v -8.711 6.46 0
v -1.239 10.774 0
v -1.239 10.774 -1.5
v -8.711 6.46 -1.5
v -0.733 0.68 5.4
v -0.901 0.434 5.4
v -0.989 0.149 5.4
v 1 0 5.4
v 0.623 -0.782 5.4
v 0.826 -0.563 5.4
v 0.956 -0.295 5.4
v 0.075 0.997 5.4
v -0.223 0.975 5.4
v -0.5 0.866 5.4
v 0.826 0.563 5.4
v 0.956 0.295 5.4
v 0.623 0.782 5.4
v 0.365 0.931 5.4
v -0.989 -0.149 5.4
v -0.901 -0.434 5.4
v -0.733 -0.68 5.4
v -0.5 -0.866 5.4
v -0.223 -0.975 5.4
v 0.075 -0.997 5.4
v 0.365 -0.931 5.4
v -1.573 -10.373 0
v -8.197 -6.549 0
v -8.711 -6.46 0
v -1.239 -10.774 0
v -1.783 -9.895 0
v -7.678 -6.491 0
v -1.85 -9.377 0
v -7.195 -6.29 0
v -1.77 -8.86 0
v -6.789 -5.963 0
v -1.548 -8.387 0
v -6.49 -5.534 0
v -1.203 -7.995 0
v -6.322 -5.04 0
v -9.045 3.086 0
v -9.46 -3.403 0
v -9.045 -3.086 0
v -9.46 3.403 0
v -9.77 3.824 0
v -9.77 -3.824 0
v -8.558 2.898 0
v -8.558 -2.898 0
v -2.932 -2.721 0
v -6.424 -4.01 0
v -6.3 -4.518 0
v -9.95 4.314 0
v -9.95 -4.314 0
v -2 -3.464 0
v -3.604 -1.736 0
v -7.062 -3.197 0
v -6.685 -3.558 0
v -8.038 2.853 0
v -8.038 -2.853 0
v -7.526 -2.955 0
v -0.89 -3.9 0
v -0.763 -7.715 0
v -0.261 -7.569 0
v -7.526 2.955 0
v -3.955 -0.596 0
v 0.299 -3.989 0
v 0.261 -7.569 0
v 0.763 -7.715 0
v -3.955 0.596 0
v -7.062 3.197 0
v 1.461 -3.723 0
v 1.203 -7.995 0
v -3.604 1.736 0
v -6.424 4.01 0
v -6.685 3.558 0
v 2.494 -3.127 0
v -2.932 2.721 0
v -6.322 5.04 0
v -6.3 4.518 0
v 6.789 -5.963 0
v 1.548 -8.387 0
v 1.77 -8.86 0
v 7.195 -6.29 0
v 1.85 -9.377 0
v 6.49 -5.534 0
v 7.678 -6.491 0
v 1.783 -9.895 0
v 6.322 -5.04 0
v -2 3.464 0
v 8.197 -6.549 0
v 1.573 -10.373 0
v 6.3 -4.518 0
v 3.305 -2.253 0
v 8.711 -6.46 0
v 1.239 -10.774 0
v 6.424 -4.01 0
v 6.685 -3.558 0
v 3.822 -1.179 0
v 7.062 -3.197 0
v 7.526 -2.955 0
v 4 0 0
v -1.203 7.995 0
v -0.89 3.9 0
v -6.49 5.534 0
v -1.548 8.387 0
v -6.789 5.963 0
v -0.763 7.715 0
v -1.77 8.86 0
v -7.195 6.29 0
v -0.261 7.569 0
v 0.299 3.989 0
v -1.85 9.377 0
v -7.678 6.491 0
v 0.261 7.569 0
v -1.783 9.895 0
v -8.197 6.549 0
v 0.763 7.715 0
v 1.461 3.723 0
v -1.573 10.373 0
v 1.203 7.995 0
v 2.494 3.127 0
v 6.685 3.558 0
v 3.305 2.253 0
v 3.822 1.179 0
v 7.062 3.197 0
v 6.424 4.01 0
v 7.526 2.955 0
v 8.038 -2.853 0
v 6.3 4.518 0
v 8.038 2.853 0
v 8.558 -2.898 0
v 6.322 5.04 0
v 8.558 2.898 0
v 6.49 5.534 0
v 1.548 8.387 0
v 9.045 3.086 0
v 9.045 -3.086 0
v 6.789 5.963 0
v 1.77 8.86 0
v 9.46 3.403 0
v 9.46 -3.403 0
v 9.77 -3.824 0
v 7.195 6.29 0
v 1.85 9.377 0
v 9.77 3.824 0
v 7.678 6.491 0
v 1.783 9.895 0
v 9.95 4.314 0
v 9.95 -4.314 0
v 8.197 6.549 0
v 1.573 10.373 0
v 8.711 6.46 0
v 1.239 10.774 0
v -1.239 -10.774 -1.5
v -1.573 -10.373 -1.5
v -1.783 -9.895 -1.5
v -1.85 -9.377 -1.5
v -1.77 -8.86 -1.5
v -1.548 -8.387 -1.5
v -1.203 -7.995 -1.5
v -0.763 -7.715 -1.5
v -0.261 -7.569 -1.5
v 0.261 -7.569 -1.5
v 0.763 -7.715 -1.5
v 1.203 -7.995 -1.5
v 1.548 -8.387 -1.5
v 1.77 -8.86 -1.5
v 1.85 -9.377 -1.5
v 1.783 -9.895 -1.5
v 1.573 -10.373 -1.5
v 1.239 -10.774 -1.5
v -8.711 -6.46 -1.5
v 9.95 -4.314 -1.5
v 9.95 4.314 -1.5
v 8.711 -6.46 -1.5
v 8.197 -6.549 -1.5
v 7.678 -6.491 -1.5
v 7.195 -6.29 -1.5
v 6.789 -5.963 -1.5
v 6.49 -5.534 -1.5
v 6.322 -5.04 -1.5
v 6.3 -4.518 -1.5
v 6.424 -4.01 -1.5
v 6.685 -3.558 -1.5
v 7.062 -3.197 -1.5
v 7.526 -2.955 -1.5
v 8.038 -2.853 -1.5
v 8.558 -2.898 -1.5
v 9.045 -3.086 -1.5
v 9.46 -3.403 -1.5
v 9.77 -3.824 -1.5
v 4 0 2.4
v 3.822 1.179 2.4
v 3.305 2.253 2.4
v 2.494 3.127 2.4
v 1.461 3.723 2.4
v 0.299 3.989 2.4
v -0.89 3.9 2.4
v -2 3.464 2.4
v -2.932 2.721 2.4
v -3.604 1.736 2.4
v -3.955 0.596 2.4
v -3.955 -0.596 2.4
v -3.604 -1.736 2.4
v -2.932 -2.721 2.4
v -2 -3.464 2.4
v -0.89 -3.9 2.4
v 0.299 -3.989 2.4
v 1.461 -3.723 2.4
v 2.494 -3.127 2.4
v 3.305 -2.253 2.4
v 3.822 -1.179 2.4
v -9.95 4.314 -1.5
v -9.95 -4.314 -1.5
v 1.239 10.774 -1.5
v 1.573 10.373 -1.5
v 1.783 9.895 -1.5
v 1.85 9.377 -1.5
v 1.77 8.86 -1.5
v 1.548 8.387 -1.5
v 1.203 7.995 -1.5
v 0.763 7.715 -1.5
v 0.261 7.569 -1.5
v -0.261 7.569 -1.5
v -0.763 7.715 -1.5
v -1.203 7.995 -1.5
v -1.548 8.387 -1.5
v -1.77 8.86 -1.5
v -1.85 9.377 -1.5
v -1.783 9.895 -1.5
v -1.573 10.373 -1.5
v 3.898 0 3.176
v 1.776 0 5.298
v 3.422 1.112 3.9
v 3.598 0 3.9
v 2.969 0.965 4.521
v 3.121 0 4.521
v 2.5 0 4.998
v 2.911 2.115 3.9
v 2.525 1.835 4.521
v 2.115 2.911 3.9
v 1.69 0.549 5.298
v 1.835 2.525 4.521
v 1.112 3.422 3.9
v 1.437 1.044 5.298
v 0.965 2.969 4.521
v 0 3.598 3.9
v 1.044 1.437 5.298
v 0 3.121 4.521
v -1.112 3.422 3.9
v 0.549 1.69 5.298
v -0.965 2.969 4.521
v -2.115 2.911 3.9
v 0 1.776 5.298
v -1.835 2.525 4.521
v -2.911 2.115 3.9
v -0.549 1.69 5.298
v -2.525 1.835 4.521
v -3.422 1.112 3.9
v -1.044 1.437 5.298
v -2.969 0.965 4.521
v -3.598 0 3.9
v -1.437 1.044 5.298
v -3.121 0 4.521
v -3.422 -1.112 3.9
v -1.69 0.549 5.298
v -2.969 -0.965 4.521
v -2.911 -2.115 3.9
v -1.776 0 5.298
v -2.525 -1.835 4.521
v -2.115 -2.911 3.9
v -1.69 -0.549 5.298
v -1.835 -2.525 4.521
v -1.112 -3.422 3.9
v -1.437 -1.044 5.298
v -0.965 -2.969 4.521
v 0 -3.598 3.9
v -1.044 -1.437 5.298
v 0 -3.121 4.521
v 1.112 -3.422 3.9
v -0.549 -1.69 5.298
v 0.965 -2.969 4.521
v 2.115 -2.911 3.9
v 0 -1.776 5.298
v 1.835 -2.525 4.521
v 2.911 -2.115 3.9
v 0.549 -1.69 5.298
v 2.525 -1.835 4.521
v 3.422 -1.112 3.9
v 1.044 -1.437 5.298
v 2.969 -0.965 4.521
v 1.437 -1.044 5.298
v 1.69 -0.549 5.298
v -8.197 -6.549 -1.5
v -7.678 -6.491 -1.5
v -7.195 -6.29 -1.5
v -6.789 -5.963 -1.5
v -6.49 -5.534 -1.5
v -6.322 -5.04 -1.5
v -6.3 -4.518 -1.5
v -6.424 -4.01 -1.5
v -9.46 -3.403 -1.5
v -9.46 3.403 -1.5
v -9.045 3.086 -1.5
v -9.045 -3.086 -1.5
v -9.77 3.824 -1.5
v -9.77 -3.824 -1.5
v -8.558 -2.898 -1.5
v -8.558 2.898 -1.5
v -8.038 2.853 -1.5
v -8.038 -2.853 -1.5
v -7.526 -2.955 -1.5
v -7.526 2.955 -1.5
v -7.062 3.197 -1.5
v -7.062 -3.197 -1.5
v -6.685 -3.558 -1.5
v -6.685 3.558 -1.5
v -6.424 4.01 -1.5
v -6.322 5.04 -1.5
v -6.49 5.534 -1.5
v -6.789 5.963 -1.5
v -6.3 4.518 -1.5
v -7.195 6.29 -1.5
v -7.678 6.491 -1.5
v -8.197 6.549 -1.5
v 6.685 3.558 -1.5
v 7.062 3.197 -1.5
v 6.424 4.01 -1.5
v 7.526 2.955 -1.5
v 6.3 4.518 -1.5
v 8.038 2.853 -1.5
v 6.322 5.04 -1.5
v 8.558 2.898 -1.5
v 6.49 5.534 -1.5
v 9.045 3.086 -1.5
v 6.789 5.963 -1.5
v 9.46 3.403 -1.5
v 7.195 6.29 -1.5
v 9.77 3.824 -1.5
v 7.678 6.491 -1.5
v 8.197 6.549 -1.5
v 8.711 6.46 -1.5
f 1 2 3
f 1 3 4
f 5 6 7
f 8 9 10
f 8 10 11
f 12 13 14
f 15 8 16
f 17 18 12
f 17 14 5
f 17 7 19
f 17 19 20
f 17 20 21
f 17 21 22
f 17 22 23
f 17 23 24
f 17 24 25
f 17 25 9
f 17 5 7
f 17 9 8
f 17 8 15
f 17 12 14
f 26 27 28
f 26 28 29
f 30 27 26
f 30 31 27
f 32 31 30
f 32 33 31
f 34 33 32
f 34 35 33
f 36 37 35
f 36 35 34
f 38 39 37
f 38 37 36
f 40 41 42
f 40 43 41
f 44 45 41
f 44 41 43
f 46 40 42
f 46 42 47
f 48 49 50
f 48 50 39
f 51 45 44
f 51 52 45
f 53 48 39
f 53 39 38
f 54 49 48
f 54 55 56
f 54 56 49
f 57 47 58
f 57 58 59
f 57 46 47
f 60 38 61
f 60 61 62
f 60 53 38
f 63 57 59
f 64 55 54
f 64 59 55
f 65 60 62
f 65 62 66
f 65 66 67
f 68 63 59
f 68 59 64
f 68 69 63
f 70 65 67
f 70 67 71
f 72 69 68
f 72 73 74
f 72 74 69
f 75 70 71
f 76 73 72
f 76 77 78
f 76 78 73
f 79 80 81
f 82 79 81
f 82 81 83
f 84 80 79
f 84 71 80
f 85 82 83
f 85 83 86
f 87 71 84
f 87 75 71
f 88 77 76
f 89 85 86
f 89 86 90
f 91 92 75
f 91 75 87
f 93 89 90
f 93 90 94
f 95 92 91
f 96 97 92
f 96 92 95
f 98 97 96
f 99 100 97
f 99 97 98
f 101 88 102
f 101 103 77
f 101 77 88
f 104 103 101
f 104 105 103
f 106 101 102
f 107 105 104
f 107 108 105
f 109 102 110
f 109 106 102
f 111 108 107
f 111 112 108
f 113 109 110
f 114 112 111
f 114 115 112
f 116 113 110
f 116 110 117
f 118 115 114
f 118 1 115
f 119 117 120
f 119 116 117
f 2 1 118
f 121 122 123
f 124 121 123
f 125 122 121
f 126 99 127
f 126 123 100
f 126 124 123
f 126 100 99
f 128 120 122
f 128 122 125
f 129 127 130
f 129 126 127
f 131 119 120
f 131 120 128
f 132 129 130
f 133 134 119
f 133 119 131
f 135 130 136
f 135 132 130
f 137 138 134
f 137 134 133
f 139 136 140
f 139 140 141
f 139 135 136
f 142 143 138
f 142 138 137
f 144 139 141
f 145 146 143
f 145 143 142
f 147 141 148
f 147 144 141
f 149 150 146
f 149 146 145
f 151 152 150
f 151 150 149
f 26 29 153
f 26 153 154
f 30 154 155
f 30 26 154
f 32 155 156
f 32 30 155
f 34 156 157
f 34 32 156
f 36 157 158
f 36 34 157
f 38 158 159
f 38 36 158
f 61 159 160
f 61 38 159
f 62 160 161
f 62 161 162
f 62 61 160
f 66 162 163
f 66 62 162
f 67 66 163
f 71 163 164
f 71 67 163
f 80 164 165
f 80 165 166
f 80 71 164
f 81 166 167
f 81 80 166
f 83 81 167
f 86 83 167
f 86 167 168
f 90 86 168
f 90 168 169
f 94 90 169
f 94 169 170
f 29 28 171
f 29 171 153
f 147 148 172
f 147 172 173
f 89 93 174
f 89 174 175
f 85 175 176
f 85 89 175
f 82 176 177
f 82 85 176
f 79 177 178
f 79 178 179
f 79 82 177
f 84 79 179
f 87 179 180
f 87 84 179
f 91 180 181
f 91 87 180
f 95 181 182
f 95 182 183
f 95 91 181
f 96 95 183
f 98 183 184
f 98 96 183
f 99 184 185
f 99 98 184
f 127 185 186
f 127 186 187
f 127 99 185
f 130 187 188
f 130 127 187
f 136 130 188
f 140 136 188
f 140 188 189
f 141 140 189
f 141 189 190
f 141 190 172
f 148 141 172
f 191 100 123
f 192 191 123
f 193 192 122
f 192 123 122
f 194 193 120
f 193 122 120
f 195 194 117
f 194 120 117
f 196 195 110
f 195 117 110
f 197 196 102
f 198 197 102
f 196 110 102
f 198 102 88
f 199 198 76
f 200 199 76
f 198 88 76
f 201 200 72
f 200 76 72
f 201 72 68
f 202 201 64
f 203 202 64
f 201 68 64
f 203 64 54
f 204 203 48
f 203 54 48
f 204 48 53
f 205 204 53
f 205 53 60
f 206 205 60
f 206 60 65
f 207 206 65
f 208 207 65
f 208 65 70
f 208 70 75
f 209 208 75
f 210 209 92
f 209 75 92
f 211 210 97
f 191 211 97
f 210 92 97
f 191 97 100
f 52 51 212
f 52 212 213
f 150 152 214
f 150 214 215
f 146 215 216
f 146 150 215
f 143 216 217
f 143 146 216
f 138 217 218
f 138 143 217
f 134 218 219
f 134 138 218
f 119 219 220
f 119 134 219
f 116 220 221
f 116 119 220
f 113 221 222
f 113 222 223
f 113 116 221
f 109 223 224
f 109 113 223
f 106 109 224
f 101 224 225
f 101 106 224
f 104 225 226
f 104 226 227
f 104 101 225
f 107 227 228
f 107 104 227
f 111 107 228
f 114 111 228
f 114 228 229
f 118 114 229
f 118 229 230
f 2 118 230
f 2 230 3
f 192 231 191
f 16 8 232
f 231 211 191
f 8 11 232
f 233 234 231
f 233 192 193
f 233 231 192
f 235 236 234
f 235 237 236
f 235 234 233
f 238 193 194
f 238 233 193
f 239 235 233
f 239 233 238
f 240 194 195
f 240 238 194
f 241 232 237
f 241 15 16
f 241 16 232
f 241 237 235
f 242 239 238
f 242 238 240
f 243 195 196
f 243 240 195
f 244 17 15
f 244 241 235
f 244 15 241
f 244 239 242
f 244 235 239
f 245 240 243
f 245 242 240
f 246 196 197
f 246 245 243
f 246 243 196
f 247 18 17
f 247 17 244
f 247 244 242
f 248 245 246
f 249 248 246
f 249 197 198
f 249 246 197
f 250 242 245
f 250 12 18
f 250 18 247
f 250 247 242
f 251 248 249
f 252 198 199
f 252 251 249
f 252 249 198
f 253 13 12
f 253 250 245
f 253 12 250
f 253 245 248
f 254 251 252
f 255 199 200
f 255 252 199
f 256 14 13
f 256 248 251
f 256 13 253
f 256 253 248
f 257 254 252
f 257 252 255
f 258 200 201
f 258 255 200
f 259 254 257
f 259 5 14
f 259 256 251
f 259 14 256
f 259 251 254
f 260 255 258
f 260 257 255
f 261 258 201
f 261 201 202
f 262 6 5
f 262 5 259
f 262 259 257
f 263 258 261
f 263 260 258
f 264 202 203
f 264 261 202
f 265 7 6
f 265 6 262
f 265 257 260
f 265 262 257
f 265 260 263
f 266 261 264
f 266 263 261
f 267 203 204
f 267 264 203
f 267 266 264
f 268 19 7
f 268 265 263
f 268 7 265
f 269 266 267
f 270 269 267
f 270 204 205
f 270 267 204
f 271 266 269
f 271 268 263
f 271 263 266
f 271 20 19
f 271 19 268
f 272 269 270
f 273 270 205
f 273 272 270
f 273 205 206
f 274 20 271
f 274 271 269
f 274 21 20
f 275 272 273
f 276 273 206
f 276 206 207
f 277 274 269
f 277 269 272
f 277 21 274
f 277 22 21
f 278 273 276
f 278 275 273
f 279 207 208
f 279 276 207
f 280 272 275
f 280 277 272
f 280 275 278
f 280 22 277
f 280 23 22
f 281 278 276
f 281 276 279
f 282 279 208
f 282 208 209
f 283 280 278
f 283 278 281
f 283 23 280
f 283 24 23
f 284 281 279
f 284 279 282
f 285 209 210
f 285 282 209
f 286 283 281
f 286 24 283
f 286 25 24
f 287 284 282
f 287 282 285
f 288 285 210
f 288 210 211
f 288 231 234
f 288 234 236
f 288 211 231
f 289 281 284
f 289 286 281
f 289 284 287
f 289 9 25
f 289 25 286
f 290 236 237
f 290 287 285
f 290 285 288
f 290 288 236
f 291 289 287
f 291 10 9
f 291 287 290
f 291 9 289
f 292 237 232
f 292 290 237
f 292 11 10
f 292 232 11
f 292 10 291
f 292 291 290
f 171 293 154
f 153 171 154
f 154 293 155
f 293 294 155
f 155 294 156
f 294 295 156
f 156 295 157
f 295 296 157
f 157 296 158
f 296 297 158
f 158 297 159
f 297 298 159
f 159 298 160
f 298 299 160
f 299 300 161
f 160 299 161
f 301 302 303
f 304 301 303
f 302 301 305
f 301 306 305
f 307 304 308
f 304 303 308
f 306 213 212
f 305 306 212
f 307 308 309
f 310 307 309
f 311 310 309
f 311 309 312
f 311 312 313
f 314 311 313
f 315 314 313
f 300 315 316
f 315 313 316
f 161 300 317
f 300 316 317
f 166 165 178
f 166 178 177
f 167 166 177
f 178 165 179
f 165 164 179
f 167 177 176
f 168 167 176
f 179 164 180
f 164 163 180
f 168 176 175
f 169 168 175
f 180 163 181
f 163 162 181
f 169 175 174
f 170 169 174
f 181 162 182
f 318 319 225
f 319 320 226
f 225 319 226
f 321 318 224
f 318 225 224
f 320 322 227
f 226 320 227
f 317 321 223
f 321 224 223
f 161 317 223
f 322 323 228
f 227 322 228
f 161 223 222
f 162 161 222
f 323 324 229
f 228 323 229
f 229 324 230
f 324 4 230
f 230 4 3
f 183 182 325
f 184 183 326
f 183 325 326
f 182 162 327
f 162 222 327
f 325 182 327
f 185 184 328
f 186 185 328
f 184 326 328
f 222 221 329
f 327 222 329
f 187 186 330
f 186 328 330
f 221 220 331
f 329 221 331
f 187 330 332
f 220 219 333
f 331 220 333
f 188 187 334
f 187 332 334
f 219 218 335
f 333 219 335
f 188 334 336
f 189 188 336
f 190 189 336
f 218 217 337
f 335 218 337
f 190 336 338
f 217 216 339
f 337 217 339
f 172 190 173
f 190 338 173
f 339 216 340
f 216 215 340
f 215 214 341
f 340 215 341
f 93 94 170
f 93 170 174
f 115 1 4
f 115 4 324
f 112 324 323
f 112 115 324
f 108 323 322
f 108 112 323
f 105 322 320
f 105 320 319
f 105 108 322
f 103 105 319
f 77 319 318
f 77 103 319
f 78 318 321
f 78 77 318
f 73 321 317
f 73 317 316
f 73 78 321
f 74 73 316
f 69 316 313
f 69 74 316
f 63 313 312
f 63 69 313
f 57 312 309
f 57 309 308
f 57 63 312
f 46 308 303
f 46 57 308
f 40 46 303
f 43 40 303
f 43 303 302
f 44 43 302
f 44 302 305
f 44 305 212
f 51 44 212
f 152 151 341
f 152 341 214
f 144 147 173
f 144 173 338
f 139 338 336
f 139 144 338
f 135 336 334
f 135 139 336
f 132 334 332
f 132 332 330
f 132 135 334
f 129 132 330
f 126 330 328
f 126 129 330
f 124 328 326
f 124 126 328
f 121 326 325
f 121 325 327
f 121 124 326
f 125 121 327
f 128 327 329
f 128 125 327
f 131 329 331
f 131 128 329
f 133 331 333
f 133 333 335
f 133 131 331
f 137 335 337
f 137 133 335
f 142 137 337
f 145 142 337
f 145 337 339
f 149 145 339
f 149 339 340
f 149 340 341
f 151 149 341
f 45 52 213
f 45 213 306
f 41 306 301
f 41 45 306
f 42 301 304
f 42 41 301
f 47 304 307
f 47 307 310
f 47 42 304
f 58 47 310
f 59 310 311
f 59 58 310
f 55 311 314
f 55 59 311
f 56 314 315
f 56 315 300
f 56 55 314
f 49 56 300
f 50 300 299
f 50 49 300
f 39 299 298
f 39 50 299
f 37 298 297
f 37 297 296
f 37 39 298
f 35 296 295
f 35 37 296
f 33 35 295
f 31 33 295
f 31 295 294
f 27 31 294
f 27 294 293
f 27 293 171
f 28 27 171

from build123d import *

# Parameters (mm, degrees)
F1_DEPTH = 1.5
F2_R     = 4
F3_DEPTH = 5.4
F4_R     = 3


with BuildPart() as f1:
    # F0 (on Top) → F1 (new body)
    with BuildSketch(Plane.XY):
        with BuildLine():
            Line((9.95, -4.314368), (9.95, 4.314368))
            ThreePointArc((9.95, 4.314368), (6.538492, 3.775), (8.711352, 6.459769))
            Line((8.711352, 6.459769), (1.238648, 10.774137))
            ThreePointArc((1.238648, 10.774137), (0, 7.55), (-1.238648, 10.774137))
            Line((-1.238648, 10.774137), (-8.711352, 6.459769))
            ThreePointArc((-8.711352, 6.459769), (-6.538492, 3.775), (-9.95, 4.314368))
            Line((-9.95, 4.314368), (-9.95, -4.314368))
            ThreePointArc((-9.95, -4.314368), (-6.538492, -3.775), (-8.711352, -6.459769))
            Line((-8.711352, -6.459769), (-1.238648, -10.774137))
            ThreePointArc((-1.238648, -10.774137), (0, -7.55), (1.238648, -10.774137))
            Line((1.238648, -10.774137), (8.711352, -6.459769))
            ThreePointArc((8.711352, -6.459769), (6.538492, -3.775), (9.95, -4.314368))
        make_face()
    extrude(amount=-F1_DEPTH)

    # F2 (on face) → F3 (join)
    with BuildSketch(Plane.XY):
        Circle(F2_R)
    extrude(amount=F3_DEPTH)

    # F4
    f4_edges = [f1.edges().sort_by_distance(p)[0] for p in [
        (-4, 0, 5.4),
    ]]
    fillet(f4_edges, radius=F4_R)


solid = f1.part
